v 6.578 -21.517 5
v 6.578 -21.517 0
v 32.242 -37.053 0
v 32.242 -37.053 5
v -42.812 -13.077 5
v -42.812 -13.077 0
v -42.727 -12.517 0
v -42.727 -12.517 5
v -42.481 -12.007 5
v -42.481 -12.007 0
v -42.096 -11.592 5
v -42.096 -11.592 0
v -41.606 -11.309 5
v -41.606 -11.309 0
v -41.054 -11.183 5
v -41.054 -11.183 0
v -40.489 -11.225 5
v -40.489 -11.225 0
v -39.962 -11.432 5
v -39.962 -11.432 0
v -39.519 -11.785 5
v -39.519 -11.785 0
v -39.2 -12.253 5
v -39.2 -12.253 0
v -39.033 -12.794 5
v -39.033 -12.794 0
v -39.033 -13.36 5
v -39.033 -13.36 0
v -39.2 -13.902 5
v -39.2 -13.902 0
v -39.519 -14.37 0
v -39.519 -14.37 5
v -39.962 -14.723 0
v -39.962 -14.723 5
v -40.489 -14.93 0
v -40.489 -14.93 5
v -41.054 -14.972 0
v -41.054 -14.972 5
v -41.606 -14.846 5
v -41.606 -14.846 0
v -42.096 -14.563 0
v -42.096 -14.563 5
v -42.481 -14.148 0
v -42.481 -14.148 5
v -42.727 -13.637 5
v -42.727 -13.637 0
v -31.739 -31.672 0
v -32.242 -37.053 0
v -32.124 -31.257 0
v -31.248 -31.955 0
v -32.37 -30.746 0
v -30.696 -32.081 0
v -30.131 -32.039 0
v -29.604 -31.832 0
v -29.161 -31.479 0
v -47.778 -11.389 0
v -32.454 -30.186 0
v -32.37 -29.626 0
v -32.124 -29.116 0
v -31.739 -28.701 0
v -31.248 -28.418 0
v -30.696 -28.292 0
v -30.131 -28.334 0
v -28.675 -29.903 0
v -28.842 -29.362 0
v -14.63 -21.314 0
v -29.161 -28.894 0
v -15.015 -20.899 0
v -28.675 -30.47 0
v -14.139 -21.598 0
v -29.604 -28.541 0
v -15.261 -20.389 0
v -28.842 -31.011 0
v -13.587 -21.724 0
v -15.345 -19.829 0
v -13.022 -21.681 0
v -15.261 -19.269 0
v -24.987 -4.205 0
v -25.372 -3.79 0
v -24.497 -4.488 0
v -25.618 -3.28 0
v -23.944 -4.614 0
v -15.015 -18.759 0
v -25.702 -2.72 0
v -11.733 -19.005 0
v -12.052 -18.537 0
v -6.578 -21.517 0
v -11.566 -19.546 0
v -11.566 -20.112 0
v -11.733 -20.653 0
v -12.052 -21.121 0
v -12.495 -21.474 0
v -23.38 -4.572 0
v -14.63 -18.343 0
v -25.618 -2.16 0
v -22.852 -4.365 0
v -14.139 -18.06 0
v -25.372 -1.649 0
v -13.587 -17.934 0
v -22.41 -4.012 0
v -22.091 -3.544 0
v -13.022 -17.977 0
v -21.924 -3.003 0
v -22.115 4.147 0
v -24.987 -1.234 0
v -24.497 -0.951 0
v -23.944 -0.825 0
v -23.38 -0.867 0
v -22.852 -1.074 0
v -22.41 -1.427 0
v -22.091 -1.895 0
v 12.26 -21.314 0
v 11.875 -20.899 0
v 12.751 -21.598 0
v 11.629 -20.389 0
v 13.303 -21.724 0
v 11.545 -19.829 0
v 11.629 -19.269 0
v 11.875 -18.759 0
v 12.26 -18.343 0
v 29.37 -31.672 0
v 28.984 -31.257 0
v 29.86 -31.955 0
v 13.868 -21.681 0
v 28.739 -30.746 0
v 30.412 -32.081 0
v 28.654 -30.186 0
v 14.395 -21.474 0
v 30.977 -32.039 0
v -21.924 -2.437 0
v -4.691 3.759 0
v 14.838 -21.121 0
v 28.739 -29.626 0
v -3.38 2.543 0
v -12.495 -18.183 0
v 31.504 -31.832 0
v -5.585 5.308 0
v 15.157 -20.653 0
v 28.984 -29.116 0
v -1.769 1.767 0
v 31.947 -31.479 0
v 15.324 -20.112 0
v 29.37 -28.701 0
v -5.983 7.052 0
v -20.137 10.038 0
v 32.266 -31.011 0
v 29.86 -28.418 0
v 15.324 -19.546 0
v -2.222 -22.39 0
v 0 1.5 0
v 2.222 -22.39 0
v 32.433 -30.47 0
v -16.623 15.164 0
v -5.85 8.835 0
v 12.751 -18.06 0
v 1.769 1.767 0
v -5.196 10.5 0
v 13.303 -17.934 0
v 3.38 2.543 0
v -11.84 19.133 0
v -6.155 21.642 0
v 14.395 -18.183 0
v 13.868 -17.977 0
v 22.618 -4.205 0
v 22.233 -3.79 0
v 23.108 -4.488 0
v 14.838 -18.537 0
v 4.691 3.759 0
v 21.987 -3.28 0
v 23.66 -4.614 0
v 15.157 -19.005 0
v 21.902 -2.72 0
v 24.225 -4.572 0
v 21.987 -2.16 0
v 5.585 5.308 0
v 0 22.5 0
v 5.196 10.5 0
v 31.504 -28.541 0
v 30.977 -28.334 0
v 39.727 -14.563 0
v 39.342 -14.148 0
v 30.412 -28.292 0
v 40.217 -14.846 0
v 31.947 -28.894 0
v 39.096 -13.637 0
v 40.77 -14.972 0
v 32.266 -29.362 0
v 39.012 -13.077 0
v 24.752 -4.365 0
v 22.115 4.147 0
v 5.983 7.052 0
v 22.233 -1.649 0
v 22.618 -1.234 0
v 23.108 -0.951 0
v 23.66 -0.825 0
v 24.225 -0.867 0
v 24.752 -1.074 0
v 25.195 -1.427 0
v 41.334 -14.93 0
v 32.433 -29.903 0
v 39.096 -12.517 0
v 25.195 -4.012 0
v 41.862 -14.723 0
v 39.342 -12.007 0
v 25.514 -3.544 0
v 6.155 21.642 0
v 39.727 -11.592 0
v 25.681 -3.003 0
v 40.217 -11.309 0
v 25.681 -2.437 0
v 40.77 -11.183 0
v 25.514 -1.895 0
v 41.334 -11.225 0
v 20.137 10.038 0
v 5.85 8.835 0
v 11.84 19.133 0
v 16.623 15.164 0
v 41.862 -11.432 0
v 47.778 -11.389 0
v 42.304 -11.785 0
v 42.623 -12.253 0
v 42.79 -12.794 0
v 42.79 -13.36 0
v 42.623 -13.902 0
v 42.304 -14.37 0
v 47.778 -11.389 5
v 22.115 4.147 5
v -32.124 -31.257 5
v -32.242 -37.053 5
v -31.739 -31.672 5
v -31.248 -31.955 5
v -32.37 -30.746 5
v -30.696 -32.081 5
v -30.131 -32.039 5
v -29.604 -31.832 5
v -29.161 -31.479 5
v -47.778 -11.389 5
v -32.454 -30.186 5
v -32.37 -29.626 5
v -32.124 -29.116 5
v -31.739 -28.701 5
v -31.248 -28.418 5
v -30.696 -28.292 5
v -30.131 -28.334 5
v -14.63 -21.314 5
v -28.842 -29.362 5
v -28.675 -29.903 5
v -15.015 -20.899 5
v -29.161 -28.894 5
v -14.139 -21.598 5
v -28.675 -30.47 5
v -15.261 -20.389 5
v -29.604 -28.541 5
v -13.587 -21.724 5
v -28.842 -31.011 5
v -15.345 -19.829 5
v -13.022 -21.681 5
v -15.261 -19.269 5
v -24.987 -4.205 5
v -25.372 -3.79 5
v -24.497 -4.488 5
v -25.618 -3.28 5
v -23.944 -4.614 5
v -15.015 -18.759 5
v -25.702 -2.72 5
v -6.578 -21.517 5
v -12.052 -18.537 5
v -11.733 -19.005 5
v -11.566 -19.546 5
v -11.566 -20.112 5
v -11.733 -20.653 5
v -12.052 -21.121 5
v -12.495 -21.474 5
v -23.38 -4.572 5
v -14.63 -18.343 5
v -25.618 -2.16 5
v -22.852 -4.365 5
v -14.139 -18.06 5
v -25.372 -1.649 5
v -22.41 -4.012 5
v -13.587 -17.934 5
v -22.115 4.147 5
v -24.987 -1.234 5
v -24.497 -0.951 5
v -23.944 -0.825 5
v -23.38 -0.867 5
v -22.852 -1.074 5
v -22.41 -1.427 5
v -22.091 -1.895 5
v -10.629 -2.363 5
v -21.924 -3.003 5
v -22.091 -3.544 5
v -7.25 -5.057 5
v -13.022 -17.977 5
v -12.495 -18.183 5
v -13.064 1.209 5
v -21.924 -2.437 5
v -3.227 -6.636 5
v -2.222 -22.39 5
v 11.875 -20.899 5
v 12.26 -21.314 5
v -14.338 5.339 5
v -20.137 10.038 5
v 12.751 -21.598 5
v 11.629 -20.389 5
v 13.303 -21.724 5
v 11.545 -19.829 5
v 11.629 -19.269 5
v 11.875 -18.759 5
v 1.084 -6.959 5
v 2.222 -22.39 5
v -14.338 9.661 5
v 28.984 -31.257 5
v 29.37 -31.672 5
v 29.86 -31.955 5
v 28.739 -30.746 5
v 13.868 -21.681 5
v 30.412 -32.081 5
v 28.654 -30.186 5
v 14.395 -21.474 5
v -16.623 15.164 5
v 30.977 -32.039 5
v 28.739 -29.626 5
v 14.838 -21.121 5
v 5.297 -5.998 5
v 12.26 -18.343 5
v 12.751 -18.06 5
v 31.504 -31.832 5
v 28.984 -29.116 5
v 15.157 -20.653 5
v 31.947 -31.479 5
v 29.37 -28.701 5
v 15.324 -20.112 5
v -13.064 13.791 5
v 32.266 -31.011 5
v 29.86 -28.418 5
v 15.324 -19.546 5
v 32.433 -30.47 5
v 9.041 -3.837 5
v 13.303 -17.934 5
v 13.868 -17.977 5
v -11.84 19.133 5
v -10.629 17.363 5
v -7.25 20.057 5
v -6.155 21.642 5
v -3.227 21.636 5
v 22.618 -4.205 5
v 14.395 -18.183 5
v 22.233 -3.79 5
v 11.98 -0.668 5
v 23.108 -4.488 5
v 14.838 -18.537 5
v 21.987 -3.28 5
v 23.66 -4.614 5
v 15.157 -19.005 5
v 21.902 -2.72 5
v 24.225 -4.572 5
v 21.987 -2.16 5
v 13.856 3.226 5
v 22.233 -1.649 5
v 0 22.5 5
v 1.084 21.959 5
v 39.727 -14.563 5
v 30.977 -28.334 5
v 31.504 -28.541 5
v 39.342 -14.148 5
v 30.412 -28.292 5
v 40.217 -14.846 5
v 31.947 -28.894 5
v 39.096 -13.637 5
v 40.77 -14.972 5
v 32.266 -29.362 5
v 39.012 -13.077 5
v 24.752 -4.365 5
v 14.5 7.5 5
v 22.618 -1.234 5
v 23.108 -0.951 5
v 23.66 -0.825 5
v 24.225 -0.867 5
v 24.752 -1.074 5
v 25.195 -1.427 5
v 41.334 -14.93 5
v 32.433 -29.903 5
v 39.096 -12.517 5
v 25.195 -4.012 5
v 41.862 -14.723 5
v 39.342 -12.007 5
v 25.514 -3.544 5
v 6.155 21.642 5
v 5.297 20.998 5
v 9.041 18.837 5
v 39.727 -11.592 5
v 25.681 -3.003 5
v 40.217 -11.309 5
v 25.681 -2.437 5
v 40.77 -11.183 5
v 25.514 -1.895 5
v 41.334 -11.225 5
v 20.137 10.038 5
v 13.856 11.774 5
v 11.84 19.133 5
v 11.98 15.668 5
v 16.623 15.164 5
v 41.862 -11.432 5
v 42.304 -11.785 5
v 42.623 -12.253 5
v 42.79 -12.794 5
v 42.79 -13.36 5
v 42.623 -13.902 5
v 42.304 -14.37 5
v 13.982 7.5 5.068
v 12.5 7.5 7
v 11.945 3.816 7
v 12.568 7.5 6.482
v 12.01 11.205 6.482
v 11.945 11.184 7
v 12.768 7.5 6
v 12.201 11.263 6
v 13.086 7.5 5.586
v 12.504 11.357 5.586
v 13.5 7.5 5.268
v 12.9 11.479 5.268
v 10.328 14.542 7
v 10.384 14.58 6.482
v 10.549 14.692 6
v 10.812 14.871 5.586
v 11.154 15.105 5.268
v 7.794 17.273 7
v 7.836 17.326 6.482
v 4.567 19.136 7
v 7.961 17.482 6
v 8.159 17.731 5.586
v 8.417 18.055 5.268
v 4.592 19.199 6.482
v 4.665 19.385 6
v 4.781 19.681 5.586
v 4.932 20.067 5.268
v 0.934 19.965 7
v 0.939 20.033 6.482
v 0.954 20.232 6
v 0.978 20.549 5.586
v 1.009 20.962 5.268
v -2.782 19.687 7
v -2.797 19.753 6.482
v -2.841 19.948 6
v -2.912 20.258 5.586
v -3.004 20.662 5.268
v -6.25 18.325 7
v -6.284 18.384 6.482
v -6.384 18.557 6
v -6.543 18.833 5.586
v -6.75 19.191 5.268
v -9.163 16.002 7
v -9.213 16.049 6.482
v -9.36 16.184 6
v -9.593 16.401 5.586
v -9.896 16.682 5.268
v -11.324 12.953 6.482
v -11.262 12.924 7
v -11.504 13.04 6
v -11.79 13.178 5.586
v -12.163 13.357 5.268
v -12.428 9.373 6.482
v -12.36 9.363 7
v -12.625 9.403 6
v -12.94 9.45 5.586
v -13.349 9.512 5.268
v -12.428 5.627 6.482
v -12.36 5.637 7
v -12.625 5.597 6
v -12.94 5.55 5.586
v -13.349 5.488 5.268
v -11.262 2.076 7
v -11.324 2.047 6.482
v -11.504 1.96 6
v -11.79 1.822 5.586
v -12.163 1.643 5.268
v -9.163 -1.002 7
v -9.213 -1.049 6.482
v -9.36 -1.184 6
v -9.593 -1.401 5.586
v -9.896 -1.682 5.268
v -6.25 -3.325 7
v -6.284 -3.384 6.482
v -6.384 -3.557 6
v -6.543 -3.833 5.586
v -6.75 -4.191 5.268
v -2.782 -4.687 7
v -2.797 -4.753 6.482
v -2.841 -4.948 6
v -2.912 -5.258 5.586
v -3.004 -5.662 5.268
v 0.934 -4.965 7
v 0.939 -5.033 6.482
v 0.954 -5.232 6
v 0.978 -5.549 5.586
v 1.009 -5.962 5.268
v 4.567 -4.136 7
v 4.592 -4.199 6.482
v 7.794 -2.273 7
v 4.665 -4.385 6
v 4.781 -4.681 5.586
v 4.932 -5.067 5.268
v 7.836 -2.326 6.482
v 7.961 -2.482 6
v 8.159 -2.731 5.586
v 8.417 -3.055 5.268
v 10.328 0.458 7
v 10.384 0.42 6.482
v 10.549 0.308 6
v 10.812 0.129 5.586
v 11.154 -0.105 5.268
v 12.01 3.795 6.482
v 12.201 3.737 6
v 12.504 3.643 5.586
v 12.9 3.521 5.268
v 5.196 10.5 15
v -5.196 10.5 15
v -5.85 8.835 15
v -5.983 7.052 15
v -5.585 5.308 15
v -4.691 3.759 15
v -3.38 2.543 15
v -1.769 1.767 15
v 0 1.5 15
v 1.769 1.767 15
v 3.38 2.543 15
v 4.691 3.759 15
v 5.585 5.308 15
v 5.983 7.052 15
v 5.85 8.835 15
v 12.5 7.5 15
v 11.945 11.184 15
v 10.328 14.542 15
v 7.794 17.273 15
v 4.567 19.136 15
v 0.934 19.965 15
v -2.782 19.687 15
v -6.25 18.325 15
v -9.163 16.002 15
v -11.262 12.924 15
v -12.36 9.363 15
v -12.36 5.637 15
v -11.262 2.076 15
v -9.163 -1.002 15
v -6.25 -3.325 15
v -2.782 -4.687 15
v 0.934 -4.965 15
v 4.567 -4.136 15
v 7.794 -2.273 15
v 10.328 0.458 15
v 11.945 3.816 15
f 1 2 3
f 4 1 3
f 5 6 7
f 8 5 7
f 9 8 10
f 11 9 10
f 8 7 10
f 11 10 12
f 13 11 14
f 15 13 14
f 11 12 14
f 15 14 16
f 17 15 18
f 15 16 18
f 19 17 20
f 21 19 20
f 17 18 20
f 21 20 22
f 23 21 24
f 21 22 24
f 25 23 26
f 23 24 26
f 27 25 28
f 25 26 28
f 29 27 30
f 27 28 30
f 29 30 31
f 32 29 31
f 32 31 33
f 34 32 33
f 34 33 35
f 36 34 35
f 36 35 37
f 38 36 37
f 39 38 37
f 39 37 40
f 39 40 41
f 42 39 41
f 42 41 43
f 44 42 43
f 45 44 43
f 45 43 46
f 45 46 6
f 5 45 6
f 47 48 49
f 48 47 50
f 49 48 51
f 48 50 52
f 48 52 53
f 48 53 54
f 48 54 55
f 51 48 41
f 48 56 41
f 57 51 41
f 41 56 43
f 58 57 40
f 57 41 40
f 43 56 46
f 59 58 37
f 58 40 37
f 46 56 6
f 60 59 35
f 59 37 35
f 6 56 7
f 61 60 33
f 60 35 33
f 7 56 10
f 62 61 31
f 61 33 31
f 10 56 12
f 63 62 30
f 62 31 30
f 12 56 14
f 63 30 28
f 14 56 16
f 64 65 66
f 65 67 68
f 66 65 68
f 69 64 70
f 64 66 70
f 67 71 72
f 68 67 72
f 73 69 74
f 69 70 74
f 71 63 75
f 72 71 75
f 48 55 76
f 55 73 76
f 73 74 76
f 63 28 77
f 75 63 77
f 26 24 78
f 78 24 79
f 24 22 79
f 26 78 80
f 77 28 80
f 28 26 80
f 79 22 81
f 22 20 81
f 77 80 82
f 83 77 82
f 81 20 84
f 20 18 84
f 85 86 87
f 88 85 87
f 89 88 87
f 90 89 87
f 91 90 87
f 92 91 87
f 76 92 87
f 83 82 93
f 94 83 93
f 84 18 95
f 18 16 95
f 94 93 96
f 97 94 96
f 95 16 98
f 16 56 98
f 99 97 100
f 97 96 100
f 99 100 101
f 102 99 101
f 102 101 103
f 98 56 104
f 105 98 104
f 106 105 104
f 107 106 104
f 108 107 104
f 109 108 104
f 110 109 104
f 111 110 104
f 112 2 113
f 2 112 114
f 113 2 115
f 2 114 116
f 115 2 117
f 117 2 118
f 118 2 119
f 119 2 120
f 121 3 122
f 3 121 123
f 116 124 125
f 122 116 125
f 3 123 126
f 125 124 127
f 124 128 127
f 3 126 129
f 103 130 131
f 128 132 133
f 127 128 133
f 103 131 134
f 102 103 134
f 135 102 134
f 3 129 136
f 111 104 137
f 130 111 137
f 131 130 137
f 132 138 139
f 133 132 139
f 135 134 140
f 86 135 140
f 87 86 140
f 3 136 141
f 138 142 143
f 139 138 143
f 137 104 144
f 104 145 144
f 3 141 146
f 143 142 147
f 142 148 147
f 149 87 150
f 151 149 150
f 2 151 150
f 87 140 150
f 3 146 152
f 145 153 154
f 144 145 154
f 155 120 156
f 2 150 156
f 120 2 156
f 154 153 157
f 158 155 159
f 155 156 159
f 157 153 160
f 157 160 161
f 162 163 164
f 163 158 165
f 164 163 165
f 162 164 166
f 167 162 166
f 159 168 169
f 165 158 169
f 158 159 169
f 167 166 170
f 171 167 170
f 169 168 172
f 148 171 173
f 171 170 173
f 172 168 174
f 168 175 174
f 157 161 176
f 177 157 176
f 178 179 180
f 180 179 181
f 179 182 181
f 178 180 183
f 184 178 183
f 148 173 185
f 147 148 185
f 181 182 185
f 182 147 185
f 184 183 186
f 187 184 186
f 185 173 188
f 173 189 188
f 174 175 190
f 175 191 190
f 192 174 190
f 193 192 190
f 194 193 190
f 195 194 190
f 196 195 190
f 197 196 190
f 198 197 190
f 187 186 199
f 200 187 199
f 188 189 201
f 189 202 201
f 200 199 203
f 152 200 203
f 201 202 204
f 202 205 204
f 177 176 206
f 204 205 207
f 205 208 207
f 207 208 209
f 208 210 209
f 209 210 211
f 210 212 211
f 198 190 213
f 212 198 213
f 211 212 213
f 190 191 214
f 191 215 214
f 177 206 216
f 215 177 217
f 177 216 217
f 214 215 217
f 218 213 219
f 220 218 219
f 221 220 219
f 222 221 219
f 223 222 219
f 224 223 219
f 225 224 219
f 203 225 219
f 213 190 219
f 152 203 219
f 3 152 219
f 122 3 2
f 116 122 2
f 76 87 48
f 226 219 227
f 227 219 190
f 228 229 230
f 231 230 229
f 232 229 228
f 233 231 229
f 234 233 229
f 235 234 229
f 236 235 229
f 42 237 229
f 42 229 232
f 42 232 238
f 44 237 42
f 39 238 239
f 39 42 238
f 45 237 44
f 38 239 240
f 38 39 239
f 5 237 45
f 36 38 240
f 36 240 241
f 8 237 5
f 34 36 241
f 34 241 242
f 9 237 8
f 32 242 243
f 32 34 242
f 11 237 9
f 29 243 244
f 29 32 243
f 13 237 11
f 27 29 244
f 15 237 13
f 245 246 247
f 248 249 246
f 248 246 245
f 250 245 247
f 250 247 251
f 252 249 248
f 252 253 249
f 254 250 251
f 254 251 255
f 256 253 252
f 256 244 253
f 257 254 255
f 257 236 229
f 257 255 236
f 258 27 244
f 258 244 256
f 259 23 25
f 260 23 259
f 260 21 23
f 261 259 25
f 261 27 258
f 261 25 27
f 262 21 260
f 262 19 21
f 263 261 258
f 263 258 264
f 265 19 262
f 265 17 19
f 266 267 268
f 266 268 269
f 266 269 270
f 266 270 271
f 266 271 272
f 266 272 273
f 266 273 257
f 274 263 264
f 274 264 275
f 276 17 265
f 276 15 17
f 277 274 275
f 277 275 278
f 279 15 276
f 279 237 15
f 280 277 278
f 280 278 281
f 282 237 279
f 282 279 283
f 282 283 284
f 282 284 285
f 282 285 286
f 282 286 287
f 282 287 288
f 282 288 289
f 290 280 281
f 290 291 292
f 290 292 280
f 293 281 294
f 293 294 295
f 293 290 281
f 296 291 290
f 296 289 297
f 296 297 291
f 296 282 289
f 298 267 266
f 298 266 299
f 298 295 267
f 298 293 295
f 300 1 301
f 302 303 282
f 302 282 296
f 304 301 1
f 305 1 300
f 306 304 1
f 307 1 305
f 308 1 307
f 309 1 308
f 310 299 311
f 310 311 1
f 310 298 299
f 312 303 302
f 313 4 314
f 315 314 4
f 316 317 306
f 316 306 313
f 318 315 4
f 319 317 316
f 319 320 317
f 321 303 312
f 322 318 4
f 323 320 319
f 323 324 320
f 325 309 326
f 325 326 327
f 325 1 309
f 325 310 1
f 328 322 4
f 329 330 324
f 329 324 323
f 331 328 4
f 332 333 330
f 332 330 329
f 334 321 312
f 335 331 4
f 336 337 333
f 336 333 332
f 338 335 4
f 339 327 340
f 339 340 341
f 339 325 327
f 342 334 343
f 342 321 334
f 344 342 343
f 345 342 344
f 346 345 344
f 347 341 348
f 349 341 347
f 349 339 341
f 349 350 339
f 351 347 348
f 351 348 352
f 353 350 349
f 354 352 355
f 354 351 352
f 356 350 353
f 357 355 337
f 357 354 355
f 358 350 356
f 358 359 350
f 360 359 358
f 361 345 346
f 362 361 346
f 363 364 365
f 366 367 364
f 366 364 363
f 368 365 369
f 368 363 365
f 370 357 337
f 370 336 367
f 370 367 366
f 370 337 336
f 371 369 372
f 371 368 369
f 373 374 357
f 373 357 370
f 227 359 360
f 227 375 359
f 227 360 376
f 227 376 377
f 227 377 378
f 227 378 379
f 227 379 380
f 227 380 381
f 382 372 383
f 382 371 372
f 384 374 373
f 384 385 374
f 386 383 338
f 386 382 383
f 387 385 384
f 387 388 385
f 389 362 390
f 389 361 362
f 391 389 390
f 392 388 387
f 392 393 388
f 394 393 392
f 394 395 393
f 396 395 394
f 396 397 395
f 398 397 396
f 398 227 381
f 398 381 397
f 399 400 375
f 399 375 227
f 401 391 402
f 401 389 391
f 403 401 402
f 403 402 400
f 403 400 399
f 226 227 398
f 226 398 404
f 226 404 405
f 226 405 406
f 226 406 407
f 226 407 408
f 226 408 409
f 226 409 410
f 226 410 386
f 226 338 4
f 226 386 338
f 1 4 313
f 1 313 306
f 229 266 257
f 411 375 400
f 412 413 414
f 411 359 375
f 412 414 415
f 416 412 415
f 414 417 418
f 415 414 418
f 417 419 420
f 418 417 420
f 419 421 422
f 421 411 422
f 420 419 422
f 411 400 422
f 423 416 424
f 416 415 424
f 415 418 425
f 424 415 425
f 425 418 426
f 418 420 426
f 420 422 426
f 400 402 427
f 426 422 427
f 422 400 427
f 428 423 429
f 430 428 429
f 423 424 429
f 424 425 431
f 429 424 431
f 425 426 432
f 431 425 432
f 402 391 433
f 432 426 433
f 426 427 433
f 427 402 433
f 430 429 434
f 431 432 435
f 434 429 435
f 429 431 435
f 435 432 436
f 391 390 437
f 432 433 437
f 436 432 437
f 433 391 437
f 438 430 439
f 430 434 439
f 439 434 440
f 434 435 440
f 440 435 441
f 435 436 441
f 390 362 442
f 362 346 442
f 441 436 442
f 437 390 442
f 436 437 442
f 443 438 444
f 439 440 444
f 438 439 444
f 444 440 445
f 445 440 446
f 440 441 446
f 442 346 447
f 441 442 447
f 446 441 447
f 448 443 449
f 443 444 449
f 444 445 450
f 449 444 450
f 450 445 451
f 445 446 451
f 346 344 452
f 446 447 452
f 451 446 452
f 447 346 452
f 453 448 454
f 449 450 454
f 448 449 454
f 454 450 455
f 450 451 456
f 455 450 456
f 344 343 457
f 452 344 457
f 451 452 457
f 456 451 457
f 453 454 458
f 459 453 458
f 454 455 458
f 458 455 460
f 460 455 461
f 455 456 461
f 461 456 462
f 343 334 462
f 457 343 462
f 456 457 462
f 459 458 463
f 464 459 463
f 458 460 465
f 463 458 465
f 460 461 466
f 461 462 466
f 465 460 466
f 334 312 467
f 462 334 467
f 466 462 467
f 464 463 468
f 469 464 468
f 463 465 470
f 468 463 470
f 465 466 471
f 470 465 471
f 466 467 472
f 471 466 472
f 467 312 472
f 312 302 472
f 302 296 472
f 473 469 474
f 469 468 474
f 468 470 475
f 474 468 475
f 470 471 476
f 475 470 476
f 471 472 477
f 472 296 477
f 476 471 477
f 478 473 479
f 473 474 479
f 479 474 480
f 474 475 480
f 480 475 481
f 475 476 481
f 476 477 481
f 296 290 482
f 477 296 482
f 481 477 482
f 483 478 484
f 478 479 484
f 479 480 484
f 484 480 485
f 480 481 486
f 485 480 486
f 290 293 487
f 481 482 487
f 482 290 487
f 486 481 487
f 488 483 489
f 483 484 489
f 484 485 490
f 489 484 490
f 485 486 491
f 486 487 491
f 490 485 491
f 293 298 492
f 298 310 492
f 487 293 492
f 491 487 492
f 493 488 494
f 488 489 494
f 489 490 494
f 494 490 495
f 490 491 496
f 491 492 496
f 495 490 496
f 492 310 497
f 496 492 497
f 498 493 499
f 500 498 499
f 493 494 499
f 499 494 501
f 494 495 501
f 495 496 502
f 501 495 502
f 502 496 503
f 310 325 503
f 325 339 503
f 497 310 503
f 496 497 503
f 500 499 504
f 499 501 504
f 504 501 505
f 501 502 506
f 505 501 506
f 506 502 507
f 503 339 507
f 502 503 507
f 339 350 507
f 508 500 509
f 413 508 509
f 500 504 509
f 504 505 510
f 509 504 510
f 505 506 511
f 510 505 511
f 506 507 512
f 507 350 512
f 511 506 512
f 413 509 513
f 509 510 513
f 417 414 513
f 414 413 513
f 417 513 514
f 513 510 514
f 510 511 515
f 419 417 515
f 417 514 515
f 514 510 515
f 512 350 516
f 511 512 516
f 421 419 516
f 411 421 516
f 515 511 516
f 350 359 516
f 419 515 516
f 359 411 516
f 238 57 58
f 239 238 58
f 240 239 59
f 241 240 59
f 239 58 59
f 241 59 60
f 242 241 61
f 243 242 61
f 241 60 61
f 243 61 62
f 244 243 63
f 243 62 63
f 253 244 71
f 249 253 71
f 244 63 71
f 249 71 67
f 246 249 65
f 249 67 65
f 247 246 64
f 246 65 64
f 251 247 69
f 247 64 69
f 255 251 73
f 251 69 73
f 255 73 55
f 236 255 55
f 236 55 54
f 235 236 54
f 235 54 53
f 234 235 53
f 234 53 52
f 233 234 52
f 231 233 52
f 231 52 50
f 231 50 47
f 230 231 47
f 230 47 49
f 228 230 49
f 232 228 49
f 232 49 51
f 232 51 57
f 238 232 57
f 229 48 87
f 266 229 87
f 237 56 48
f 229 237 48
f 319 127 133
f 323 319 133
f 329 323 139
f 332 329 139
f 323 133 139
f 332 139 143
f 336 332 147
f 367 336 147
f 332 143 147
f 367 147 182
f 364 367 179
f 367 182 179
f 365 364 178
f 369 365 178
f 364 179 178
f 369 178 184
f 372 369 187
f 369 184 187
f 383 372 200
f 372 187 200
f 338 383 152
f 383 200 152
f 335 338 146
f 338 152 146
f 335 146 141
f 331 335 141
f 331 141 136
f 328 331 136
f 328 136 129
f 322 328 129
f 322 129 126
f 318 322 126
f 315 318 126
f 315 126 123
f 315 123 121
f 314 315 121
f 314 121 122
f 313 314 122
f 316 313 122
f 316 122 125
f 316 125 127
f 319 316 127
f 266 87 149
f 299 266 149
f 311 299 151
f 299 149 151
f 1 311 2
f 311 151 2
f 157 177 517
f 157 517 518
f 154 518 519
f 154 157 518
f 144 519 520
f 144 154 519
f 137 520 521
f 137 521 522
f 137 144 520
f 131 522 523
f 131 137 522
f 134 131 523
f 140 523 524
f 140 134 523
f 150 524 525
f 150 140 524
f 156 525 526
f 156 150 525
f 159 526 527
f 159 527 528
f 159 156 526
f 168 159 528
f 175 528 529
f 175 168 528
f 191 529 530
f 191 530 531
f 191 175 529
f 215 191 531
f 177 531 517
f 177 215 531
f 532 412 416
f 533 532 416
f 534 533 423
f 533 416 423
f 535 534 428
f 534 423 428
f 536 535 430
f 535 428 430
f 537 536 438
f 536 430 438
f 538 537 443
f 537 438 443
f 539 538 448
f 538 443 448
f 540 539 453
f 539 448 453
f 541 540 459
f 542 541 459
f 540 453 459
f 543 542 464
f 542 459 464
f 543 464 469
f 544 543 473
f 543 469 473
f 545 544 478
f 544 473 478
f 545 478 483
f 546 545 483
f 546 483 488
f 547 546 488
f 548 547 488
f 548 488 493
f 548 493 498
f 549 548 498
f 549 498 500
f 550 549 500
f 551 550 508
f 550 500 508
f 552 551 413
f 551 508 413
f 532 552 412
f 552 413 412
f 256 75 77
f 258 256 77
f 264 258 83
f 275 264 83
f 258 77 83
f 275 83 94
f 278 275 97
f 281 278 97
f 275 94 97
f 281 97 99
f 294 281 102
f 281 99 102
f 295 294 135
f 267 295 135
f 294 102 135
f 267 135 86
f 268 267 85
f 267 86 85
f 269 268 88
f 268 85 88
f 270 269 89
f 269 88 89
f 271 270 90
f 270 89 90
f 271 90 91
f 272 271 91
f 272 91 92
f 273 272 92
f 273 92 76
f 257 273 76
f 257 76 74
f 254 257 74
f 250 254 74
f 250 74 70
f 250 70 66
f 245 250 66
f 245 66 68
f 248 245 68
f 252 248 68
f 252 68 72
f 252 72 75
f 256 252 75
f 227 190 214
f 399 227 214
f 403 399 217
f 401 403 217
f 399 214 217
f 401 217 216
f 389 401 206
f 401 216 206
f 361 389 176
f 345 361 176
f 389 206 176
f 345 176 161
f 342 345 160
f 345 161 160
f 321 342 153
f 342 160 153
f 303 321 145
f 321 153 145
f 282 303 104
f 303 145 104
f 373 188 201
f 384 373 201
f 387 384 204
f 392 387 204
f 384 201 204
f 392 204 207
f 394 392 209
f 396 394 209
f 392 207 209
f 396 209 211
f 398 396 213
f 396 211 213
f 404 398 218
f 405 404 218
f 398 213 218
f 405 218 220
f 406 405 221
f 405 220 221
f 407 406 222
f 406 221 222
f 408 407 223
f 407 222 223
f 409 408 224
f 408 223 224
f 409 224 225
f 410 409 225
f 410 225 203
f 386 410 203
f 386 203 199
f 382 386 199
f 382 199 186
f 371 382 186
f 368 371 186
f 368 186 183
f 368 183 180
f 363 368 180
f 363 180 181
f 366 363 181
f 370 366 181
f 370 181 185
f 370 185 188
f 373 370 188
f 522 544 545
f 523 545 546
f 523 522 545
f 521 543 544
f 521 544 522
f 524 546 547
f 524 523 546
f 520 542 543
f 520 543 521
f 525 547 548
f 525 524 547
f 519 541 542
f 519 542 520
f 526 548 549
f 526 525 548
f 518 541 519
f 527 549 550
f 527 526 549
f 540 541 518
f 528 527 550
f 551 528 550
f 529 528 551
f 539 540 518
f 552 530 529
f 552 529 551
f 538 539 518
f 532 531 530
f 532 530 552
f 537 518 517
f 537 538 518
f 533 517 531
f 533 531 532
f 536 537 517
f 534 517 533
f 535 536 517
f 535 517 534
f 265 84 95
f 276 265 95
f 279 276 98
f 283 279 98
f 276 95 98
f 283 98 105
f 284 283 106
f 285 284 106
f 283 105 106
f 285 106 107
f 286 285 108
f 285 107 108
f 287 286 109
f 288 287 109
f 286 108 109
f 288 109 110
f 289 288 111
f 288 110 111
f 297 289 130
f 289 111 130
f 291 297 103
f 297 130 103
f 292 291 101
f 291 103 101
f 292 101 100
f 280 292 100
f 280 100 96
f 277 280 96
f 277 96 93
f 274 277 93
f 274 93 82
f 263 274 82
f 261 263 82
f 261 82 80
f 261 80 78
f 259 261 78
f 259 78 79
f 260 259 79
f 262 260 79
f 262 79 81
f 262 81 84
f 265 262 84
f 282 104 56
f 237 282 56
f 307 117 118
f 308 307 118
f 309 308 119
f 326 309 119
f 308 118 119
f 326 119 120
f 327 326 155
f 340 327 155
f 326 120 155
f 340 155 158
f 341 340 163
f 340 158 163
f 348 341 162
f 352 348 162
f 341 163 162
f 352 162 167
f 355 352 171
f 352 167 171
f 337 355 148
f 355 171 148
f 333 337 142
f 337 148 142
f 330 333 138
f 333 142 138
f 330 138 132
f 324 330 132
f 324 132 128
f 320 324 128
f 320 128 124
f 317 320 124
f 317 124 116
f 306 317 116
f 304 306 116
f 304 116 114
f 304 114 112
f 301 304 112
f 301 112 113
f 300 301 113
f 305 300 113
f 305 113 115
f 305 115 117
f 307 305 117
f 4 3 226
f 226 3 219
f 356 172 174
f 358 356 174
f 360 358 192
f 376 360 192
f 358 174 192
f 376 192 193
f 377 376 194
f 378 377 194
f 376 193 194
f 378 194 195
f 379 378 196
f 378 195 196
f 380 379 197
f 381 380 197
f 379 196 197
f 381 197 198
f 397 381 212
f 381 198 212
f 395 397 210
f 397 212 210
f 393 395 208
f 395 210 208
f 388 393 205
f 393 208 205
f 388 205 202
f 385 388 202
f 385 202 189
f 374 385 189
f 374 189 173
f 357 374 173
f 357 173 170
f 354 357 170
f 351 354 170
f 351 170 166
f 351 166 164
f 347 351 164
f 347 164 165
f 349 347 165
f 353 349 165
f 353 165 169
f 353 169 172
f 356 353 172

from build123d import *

# Parameters (mm, degrees)
BOSS_EXTRUDE1_DEPTH  = 5
M3_CLEARANCE_HOLE1_D = 3.8
BOSS_EXTRUDE3_START  = 5
SKETCH2_6_R          = 12.5
BOSS_EXTRUDE3_DEPTH  = 10
FILLET1_R            = 2


with BuildPart() as part:
    # Sketch2 → Boss-Extrude1 (new body)
    with BuildSketch(Plane.XY):
        with BuildLine():
            Line((6.578363356, -21.516857009), (32.24208854, -37.05304733))
            Line((32.24208854, -37.05304733), (47.778278861, -11.389322146))
            Line((47.778278861, -11.389322146), (22.114553677, 4.146868175))
            ThreePointArc((22.114553677, 4.146868175), (0, 22.5), (-22.114553677, 4.146868175))
            Line((-22.114553677, 4.146868175), (-47.778278861, -11.389322146))
            Line((-47.778278861, -11.389322146), (-32.24208854, -37.05304733))
            Line((-32.24208854, -37.05304733), (-6.578363356, -21.516857009))
            ThreePointArc((-6.578363356, -21.516857009), (0, -22.5), (6.578363356, -21.516857009))
        make_face()
        with BuildLine():
            Line((5.196152423, 10.5), (-5.196152423, 10.5))
            ThreePointArc((-5.196152423, 10.5), (0, 1.5), (5.196152423, 10.5))
        make_face(mode=Mode.SUBTRACT)
    extrude(amount=BOSS_EXTRUDE1_DEPTH)

    # M3 Clearance Hole1 (through all)
    with Locations(Plane.XY.offset(5)):
        with Locations((-40.911626277, -13.077244623), (-23.802476154, -2.719784409), (-13.44501594, -19.828934532), (-30.554166063, -30.186394746), (13.44501594, -19.828934532), (23.802476154, -2.719784409), (40.911626277, -13.077244623), (30.554166063, -30.186394746)):
            Hole(M3_CLEARANCE_HOLE1_D / 2)

    # Sketch2<6> → Boss-Extrude3 (add)
    with BuildSketch(Plane.XY.offset(BOSS_EXTRUDE3_START)):
        with Locations((0, 7.5)):
            Circle(SKETCH2_6_R)
        with BuildLine():
            ThreePointArc((-5.196152423, 10.5), (0, 1.5), (5.196152423, 10.5))
            Line((5.196152423, 10.5), (-5.196152423, 10.5))
        make_face(mode=Mode.SUBTRACT)
    extrude(amount=BOSS_EXTRUDE3_DEPTH)

    # Fillet1
    fillet1_edges = [part.edges().sort_by_distance(p)[0] for p in [
        (-12.5, 7.5, 5),
    ]]
    fillet(fillet1_edges, radius=FILLET1_R)


solid = part.part
